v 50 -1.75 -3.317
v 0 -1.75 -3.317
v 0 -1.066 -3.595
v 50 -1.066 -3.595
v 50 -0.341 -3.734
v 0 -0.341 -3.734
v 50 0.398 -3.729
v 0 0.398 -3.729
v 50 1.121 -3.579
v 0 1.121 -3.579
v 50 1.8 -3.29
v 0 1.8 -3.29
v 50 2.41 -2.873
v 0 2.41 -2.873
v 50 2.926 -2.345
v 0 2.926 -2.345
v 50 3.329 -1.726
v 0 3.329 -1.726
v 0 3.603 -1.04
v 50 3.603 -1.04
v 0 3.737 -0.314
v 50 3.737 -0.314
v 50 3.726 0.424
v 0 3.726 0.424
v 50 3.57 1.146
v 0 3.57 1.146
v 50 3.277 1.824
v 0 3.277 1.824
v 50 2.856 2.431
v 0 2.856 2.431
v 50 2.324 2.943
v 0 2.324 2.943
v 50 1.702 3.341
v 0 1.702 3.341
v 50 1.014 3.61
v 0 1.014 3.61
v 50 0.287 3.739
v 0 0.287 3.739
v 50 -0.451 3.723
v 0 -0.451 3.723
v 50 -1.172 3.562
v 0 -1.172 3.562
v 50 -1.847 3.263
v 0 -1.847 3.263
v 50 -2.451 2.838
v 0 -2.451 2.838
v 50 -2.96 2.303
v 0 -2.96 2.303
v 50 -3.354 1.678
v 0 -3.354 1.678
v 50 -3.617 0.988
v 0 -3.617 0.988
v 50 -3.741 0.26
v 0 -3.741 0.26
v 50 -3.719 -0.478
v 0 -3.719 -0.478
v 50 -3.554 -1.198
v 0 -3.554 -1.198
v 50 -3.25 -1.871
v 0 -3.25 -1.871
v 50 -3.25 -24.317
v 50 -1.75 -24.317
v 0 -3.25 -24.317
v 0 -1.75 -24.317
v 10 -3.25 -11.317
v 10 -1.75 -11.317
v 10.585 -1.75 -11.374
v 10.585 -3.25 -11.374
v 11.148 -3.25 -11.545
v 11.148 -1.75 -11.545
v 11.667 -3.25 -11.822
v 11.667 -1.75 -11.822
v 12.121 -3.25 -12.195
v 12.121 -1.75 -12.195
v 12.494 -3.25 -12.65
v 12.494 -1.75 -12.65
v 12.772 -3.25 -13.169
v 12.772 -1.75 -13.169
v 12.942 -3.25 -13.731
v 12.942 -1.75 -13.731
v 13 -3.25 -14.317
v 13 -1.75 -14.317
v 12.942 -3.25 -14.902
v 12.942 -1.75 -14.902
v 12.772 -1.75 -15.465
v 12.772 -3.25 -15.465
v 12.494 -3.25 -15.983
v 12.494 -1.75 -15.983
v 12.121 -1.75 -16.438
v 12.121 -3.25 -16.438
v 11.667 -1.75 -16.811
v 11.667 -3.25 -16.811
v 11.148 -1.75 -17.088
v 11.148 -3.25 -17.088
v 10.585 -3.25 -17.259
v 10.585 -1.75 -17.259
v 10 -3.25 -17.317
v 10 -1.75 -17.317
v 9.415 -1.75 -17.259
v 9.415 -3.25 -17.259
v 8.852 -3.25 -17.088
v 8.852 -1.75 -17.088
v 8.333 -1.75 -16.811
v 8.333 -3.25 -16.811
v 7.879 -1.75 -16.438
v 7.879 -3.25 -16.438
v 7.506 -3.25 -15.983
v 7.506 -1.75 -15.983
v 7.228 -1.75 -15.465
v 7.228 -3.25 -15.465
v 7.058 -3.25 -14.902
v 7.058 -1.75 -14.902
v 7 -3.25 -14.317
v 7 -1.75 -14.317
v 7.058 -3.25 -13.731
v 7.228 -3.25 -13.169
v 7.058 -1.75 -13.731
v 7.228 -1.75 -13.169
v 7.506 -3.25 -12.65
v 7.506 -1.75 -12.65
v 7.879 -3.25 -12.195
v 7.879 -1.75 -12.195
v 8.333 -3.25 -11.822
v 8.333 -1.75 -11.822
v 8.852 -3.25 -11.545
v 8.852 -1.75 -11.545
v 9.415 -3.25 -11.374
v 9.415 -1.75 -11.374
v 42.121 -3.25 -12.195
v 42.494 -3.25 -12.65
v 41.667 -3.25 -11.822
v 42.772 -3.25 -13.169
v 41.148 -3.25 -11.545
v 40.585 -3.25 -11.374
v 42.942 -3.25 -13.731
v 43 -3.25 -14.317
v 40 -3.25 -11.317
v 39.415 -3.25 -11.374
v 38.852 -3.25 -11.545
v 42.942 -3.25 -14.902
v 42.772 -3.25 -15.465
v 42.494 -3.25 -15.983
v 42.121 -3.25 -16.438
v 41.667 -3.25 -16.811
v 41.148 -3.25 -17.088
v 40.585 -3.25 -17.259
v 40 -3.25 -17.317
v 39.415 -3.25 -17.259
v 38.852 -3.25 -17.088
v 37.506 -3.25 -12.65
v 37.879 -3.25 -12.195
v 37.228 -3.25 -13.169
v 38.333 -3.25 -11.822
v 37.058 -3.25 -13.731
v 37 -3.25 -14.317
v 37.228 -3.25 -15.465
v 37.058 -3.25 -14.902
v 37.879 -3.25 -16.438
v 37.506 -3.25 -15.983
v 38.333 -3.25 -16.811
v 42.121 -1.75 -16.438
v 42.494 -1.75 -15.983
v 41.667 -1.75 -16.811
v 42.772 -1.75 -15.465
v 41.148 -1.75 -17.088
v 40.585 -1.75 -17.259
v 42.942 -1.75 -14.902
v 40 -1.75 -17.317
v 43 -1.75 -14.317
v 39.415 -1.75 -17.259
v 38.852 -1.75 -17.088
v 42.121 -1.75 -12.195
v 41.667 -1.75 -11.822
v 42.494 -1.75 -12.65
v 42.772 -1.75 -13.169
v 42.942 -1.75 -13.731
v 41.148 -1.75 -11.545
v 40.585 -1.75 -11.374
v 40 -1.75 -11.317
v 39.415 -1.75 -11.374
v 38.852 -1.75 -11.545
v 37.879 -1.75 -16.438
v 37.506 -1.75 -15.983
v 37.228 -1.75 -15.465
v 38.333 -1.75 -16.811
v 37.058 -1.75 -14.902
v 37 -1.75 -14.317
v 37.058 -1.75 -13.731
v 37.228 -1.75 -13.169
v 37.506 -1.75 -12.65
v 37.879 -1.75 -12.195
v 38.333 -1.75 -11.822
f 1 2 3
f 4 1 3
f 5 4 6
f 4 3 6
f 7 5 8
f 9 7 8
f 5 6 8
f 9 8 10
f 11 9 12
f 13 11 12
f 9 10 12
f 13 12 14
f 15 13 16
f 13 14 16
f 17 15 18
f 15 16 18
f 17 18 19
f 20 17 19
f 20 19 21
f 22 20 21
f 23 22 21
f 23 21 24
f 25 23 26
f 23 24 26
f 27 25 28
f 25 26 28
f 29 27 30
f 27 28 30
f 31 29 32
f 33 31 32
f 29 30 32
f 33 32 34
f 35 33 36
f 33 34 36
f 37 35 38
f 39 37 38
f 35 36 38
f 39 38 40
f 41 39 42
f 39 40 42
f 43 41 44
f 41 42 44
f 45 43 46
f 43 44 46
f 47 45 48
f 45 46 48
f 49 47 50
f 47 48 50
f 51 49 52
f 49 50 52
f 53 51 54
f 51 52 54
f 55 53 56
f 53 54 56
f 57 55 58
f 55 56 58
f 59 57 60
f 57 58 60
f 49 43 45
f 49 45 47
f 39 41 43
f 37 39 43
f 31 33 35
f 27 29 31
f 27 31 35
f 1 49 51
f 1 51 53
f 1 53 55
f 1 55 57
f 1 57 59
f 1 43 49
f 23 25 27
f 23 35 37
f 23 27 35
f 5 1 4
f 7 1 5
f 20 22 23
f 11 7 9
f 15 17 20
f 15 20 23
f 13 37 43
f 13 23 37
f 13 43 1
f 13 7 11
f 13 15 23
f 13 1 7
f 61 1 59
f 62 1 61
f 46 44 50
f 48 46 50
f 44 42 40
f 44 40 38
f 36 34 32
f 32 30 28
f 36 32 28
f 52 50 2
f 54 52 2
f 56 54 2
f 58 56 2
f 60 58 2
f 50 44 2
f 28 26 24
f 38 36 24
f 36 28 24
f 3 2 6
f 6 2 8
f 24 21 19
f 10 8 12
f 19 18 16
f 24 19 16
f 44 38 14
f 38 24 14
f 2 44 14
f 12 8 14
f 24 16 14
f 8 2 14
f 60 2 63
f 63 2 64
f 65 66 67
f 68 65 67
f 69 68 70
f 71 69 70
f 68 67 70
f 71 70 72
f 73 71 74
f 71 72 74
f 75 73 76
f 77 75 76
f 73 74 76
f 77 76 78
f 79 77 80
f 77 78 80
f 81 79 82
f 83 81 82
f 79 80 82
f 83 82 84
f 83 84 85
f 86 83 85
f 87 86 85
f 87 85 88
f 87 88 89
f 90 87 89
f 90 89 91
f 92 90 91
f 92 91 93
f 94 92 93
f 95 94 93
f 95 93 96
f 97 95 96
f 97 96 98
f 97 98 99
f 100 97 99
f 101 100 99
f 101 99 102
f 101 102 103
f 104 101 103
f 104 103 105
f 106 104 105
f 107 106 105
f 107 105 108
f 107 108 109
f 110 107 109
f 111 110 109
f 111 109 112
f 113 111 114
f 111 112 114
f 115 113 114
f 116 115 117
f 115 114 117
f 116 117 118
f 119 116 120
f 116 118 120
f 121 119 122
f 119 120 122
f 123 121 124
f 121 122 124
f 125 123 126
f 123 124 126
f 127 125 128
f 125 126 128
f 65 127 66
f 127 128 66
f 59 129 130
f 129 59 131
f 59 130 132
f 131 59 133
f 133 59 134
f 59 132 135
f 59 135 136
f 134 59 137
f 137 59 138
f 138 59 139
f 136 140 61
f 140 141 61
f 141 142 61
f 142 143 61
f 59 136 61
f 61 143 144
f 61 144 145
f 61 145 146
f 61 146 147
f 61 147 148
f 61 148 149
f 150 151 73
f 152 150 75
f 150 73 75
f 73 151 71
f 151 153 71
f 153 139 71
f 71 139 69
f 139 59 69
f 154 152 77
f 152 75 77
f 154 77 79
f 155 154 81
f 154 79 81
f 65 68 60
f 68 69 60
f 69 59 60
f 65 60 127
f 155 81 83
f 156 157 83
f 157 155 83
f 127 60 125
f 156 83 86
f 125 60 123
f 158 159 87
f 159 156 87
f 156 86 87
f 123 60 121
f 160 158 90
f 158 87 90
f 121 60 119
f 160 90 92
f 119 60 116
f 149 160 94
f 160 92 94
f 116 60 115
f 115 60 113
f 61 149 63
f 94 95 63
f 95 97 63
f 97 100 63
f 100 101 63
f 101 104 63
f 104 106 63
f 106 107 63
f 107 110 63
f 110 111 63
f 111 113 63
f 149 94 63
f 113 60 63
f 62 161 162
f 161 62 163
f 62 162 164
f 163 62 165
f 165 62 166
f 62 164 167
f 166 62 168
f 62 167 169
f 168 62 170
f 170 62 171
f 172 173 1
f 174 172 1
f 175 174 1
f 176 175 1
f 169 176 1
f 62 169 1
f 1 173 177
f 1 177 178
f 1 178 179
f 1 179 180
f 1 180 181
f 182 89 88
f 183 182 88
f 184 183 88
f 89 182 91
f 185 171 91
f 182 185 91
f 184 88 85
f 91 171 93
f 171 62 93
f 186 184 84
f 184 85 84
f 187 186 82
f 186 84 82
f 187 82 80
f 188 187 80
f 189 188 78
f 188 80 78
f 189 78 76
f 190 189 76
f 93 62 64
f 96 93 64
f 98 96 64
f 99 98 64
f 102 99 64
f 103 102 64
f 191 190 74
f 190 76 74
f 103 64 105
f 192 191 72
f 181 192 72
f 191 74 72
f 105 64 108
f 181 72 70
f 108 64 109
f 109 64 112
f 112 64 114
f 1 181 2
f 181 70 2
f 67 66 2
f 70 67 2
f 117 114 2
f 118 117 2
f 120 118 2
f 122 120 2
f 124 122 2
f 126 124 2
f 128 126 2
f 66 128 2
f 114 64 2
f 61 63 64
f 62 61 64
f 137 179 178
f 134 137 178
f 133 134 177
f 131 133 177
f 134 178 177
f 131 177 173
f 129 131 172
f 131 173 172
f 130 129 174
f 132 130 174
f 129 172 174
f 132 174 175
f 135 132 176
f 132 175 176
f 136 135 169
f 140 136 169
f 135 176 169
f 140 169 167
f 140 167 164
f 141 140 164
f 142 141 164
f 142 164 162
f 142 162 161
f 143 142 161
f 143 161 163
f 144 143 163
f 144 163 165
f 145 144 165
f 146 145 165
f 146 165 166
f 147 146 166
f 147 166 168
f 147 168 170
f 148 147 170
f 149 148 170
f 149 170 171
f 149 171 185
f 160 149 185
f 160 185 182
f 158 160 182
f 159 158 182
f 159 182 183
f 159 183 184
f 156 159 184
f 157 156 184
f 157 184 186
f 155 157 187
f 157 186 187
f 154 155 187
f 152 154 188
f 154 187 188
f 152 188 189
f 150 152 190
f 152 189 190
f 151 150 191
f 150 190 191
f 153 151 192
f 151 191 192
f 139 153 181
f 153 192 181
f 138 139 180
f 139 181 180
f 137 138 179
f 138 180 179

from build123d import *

# Parameters (mm, degrees)
SALIENTE_EXTRUIR1_DEPTH = 50
CROQUIS2_R              = 3
CORTAR_EXTRUIR1_DEPTH   = 50


with BuildPart() as part:
    # Croquis1 → Saliente-Extruir1 (new body)
    with BuildSketch(Plane(origin=(0, 0, 0), x_dir=(0, 0, -1), z_dir=(1, 0, 0))):
        with BuildLine():
            Line((1.870828693, -3.25), (24.31662479, -3.25))
            Line((24.31662479, -3.25), (24.31662479, -1.75))
            Line((24.31662479, -1.75), (3.31662479, -1.75))
            ThreePointArc((3.31662479, -1.75), (-2.699984891, 2.602418411), (1.870828693, -3.25))
        make_face()
    extrude(amount=SALIENTE_EXTRUIR1_DEPTH)

    # Croquis2 → Cortar-Extruir1 (cut)
    with BuildSketch(Plane(origin=(0, -1.75, 0), x_dir=(1, 0, 0), z_dir=(0, 1, 0))):
        with Locations(Location((10, 14.31662479, 0), (0, 0, 270))):
            Circle(CROQUIS2_R)
        with Locations(Location((40, 14.31662479, 0), (0, 0, 270))):
            Circle(CROQUIS2_R)
    extrude(amount=-CORTAR_EXTRUIR1_DEPTH, mode=Mode.SUBTRACT)


solid = part.part
